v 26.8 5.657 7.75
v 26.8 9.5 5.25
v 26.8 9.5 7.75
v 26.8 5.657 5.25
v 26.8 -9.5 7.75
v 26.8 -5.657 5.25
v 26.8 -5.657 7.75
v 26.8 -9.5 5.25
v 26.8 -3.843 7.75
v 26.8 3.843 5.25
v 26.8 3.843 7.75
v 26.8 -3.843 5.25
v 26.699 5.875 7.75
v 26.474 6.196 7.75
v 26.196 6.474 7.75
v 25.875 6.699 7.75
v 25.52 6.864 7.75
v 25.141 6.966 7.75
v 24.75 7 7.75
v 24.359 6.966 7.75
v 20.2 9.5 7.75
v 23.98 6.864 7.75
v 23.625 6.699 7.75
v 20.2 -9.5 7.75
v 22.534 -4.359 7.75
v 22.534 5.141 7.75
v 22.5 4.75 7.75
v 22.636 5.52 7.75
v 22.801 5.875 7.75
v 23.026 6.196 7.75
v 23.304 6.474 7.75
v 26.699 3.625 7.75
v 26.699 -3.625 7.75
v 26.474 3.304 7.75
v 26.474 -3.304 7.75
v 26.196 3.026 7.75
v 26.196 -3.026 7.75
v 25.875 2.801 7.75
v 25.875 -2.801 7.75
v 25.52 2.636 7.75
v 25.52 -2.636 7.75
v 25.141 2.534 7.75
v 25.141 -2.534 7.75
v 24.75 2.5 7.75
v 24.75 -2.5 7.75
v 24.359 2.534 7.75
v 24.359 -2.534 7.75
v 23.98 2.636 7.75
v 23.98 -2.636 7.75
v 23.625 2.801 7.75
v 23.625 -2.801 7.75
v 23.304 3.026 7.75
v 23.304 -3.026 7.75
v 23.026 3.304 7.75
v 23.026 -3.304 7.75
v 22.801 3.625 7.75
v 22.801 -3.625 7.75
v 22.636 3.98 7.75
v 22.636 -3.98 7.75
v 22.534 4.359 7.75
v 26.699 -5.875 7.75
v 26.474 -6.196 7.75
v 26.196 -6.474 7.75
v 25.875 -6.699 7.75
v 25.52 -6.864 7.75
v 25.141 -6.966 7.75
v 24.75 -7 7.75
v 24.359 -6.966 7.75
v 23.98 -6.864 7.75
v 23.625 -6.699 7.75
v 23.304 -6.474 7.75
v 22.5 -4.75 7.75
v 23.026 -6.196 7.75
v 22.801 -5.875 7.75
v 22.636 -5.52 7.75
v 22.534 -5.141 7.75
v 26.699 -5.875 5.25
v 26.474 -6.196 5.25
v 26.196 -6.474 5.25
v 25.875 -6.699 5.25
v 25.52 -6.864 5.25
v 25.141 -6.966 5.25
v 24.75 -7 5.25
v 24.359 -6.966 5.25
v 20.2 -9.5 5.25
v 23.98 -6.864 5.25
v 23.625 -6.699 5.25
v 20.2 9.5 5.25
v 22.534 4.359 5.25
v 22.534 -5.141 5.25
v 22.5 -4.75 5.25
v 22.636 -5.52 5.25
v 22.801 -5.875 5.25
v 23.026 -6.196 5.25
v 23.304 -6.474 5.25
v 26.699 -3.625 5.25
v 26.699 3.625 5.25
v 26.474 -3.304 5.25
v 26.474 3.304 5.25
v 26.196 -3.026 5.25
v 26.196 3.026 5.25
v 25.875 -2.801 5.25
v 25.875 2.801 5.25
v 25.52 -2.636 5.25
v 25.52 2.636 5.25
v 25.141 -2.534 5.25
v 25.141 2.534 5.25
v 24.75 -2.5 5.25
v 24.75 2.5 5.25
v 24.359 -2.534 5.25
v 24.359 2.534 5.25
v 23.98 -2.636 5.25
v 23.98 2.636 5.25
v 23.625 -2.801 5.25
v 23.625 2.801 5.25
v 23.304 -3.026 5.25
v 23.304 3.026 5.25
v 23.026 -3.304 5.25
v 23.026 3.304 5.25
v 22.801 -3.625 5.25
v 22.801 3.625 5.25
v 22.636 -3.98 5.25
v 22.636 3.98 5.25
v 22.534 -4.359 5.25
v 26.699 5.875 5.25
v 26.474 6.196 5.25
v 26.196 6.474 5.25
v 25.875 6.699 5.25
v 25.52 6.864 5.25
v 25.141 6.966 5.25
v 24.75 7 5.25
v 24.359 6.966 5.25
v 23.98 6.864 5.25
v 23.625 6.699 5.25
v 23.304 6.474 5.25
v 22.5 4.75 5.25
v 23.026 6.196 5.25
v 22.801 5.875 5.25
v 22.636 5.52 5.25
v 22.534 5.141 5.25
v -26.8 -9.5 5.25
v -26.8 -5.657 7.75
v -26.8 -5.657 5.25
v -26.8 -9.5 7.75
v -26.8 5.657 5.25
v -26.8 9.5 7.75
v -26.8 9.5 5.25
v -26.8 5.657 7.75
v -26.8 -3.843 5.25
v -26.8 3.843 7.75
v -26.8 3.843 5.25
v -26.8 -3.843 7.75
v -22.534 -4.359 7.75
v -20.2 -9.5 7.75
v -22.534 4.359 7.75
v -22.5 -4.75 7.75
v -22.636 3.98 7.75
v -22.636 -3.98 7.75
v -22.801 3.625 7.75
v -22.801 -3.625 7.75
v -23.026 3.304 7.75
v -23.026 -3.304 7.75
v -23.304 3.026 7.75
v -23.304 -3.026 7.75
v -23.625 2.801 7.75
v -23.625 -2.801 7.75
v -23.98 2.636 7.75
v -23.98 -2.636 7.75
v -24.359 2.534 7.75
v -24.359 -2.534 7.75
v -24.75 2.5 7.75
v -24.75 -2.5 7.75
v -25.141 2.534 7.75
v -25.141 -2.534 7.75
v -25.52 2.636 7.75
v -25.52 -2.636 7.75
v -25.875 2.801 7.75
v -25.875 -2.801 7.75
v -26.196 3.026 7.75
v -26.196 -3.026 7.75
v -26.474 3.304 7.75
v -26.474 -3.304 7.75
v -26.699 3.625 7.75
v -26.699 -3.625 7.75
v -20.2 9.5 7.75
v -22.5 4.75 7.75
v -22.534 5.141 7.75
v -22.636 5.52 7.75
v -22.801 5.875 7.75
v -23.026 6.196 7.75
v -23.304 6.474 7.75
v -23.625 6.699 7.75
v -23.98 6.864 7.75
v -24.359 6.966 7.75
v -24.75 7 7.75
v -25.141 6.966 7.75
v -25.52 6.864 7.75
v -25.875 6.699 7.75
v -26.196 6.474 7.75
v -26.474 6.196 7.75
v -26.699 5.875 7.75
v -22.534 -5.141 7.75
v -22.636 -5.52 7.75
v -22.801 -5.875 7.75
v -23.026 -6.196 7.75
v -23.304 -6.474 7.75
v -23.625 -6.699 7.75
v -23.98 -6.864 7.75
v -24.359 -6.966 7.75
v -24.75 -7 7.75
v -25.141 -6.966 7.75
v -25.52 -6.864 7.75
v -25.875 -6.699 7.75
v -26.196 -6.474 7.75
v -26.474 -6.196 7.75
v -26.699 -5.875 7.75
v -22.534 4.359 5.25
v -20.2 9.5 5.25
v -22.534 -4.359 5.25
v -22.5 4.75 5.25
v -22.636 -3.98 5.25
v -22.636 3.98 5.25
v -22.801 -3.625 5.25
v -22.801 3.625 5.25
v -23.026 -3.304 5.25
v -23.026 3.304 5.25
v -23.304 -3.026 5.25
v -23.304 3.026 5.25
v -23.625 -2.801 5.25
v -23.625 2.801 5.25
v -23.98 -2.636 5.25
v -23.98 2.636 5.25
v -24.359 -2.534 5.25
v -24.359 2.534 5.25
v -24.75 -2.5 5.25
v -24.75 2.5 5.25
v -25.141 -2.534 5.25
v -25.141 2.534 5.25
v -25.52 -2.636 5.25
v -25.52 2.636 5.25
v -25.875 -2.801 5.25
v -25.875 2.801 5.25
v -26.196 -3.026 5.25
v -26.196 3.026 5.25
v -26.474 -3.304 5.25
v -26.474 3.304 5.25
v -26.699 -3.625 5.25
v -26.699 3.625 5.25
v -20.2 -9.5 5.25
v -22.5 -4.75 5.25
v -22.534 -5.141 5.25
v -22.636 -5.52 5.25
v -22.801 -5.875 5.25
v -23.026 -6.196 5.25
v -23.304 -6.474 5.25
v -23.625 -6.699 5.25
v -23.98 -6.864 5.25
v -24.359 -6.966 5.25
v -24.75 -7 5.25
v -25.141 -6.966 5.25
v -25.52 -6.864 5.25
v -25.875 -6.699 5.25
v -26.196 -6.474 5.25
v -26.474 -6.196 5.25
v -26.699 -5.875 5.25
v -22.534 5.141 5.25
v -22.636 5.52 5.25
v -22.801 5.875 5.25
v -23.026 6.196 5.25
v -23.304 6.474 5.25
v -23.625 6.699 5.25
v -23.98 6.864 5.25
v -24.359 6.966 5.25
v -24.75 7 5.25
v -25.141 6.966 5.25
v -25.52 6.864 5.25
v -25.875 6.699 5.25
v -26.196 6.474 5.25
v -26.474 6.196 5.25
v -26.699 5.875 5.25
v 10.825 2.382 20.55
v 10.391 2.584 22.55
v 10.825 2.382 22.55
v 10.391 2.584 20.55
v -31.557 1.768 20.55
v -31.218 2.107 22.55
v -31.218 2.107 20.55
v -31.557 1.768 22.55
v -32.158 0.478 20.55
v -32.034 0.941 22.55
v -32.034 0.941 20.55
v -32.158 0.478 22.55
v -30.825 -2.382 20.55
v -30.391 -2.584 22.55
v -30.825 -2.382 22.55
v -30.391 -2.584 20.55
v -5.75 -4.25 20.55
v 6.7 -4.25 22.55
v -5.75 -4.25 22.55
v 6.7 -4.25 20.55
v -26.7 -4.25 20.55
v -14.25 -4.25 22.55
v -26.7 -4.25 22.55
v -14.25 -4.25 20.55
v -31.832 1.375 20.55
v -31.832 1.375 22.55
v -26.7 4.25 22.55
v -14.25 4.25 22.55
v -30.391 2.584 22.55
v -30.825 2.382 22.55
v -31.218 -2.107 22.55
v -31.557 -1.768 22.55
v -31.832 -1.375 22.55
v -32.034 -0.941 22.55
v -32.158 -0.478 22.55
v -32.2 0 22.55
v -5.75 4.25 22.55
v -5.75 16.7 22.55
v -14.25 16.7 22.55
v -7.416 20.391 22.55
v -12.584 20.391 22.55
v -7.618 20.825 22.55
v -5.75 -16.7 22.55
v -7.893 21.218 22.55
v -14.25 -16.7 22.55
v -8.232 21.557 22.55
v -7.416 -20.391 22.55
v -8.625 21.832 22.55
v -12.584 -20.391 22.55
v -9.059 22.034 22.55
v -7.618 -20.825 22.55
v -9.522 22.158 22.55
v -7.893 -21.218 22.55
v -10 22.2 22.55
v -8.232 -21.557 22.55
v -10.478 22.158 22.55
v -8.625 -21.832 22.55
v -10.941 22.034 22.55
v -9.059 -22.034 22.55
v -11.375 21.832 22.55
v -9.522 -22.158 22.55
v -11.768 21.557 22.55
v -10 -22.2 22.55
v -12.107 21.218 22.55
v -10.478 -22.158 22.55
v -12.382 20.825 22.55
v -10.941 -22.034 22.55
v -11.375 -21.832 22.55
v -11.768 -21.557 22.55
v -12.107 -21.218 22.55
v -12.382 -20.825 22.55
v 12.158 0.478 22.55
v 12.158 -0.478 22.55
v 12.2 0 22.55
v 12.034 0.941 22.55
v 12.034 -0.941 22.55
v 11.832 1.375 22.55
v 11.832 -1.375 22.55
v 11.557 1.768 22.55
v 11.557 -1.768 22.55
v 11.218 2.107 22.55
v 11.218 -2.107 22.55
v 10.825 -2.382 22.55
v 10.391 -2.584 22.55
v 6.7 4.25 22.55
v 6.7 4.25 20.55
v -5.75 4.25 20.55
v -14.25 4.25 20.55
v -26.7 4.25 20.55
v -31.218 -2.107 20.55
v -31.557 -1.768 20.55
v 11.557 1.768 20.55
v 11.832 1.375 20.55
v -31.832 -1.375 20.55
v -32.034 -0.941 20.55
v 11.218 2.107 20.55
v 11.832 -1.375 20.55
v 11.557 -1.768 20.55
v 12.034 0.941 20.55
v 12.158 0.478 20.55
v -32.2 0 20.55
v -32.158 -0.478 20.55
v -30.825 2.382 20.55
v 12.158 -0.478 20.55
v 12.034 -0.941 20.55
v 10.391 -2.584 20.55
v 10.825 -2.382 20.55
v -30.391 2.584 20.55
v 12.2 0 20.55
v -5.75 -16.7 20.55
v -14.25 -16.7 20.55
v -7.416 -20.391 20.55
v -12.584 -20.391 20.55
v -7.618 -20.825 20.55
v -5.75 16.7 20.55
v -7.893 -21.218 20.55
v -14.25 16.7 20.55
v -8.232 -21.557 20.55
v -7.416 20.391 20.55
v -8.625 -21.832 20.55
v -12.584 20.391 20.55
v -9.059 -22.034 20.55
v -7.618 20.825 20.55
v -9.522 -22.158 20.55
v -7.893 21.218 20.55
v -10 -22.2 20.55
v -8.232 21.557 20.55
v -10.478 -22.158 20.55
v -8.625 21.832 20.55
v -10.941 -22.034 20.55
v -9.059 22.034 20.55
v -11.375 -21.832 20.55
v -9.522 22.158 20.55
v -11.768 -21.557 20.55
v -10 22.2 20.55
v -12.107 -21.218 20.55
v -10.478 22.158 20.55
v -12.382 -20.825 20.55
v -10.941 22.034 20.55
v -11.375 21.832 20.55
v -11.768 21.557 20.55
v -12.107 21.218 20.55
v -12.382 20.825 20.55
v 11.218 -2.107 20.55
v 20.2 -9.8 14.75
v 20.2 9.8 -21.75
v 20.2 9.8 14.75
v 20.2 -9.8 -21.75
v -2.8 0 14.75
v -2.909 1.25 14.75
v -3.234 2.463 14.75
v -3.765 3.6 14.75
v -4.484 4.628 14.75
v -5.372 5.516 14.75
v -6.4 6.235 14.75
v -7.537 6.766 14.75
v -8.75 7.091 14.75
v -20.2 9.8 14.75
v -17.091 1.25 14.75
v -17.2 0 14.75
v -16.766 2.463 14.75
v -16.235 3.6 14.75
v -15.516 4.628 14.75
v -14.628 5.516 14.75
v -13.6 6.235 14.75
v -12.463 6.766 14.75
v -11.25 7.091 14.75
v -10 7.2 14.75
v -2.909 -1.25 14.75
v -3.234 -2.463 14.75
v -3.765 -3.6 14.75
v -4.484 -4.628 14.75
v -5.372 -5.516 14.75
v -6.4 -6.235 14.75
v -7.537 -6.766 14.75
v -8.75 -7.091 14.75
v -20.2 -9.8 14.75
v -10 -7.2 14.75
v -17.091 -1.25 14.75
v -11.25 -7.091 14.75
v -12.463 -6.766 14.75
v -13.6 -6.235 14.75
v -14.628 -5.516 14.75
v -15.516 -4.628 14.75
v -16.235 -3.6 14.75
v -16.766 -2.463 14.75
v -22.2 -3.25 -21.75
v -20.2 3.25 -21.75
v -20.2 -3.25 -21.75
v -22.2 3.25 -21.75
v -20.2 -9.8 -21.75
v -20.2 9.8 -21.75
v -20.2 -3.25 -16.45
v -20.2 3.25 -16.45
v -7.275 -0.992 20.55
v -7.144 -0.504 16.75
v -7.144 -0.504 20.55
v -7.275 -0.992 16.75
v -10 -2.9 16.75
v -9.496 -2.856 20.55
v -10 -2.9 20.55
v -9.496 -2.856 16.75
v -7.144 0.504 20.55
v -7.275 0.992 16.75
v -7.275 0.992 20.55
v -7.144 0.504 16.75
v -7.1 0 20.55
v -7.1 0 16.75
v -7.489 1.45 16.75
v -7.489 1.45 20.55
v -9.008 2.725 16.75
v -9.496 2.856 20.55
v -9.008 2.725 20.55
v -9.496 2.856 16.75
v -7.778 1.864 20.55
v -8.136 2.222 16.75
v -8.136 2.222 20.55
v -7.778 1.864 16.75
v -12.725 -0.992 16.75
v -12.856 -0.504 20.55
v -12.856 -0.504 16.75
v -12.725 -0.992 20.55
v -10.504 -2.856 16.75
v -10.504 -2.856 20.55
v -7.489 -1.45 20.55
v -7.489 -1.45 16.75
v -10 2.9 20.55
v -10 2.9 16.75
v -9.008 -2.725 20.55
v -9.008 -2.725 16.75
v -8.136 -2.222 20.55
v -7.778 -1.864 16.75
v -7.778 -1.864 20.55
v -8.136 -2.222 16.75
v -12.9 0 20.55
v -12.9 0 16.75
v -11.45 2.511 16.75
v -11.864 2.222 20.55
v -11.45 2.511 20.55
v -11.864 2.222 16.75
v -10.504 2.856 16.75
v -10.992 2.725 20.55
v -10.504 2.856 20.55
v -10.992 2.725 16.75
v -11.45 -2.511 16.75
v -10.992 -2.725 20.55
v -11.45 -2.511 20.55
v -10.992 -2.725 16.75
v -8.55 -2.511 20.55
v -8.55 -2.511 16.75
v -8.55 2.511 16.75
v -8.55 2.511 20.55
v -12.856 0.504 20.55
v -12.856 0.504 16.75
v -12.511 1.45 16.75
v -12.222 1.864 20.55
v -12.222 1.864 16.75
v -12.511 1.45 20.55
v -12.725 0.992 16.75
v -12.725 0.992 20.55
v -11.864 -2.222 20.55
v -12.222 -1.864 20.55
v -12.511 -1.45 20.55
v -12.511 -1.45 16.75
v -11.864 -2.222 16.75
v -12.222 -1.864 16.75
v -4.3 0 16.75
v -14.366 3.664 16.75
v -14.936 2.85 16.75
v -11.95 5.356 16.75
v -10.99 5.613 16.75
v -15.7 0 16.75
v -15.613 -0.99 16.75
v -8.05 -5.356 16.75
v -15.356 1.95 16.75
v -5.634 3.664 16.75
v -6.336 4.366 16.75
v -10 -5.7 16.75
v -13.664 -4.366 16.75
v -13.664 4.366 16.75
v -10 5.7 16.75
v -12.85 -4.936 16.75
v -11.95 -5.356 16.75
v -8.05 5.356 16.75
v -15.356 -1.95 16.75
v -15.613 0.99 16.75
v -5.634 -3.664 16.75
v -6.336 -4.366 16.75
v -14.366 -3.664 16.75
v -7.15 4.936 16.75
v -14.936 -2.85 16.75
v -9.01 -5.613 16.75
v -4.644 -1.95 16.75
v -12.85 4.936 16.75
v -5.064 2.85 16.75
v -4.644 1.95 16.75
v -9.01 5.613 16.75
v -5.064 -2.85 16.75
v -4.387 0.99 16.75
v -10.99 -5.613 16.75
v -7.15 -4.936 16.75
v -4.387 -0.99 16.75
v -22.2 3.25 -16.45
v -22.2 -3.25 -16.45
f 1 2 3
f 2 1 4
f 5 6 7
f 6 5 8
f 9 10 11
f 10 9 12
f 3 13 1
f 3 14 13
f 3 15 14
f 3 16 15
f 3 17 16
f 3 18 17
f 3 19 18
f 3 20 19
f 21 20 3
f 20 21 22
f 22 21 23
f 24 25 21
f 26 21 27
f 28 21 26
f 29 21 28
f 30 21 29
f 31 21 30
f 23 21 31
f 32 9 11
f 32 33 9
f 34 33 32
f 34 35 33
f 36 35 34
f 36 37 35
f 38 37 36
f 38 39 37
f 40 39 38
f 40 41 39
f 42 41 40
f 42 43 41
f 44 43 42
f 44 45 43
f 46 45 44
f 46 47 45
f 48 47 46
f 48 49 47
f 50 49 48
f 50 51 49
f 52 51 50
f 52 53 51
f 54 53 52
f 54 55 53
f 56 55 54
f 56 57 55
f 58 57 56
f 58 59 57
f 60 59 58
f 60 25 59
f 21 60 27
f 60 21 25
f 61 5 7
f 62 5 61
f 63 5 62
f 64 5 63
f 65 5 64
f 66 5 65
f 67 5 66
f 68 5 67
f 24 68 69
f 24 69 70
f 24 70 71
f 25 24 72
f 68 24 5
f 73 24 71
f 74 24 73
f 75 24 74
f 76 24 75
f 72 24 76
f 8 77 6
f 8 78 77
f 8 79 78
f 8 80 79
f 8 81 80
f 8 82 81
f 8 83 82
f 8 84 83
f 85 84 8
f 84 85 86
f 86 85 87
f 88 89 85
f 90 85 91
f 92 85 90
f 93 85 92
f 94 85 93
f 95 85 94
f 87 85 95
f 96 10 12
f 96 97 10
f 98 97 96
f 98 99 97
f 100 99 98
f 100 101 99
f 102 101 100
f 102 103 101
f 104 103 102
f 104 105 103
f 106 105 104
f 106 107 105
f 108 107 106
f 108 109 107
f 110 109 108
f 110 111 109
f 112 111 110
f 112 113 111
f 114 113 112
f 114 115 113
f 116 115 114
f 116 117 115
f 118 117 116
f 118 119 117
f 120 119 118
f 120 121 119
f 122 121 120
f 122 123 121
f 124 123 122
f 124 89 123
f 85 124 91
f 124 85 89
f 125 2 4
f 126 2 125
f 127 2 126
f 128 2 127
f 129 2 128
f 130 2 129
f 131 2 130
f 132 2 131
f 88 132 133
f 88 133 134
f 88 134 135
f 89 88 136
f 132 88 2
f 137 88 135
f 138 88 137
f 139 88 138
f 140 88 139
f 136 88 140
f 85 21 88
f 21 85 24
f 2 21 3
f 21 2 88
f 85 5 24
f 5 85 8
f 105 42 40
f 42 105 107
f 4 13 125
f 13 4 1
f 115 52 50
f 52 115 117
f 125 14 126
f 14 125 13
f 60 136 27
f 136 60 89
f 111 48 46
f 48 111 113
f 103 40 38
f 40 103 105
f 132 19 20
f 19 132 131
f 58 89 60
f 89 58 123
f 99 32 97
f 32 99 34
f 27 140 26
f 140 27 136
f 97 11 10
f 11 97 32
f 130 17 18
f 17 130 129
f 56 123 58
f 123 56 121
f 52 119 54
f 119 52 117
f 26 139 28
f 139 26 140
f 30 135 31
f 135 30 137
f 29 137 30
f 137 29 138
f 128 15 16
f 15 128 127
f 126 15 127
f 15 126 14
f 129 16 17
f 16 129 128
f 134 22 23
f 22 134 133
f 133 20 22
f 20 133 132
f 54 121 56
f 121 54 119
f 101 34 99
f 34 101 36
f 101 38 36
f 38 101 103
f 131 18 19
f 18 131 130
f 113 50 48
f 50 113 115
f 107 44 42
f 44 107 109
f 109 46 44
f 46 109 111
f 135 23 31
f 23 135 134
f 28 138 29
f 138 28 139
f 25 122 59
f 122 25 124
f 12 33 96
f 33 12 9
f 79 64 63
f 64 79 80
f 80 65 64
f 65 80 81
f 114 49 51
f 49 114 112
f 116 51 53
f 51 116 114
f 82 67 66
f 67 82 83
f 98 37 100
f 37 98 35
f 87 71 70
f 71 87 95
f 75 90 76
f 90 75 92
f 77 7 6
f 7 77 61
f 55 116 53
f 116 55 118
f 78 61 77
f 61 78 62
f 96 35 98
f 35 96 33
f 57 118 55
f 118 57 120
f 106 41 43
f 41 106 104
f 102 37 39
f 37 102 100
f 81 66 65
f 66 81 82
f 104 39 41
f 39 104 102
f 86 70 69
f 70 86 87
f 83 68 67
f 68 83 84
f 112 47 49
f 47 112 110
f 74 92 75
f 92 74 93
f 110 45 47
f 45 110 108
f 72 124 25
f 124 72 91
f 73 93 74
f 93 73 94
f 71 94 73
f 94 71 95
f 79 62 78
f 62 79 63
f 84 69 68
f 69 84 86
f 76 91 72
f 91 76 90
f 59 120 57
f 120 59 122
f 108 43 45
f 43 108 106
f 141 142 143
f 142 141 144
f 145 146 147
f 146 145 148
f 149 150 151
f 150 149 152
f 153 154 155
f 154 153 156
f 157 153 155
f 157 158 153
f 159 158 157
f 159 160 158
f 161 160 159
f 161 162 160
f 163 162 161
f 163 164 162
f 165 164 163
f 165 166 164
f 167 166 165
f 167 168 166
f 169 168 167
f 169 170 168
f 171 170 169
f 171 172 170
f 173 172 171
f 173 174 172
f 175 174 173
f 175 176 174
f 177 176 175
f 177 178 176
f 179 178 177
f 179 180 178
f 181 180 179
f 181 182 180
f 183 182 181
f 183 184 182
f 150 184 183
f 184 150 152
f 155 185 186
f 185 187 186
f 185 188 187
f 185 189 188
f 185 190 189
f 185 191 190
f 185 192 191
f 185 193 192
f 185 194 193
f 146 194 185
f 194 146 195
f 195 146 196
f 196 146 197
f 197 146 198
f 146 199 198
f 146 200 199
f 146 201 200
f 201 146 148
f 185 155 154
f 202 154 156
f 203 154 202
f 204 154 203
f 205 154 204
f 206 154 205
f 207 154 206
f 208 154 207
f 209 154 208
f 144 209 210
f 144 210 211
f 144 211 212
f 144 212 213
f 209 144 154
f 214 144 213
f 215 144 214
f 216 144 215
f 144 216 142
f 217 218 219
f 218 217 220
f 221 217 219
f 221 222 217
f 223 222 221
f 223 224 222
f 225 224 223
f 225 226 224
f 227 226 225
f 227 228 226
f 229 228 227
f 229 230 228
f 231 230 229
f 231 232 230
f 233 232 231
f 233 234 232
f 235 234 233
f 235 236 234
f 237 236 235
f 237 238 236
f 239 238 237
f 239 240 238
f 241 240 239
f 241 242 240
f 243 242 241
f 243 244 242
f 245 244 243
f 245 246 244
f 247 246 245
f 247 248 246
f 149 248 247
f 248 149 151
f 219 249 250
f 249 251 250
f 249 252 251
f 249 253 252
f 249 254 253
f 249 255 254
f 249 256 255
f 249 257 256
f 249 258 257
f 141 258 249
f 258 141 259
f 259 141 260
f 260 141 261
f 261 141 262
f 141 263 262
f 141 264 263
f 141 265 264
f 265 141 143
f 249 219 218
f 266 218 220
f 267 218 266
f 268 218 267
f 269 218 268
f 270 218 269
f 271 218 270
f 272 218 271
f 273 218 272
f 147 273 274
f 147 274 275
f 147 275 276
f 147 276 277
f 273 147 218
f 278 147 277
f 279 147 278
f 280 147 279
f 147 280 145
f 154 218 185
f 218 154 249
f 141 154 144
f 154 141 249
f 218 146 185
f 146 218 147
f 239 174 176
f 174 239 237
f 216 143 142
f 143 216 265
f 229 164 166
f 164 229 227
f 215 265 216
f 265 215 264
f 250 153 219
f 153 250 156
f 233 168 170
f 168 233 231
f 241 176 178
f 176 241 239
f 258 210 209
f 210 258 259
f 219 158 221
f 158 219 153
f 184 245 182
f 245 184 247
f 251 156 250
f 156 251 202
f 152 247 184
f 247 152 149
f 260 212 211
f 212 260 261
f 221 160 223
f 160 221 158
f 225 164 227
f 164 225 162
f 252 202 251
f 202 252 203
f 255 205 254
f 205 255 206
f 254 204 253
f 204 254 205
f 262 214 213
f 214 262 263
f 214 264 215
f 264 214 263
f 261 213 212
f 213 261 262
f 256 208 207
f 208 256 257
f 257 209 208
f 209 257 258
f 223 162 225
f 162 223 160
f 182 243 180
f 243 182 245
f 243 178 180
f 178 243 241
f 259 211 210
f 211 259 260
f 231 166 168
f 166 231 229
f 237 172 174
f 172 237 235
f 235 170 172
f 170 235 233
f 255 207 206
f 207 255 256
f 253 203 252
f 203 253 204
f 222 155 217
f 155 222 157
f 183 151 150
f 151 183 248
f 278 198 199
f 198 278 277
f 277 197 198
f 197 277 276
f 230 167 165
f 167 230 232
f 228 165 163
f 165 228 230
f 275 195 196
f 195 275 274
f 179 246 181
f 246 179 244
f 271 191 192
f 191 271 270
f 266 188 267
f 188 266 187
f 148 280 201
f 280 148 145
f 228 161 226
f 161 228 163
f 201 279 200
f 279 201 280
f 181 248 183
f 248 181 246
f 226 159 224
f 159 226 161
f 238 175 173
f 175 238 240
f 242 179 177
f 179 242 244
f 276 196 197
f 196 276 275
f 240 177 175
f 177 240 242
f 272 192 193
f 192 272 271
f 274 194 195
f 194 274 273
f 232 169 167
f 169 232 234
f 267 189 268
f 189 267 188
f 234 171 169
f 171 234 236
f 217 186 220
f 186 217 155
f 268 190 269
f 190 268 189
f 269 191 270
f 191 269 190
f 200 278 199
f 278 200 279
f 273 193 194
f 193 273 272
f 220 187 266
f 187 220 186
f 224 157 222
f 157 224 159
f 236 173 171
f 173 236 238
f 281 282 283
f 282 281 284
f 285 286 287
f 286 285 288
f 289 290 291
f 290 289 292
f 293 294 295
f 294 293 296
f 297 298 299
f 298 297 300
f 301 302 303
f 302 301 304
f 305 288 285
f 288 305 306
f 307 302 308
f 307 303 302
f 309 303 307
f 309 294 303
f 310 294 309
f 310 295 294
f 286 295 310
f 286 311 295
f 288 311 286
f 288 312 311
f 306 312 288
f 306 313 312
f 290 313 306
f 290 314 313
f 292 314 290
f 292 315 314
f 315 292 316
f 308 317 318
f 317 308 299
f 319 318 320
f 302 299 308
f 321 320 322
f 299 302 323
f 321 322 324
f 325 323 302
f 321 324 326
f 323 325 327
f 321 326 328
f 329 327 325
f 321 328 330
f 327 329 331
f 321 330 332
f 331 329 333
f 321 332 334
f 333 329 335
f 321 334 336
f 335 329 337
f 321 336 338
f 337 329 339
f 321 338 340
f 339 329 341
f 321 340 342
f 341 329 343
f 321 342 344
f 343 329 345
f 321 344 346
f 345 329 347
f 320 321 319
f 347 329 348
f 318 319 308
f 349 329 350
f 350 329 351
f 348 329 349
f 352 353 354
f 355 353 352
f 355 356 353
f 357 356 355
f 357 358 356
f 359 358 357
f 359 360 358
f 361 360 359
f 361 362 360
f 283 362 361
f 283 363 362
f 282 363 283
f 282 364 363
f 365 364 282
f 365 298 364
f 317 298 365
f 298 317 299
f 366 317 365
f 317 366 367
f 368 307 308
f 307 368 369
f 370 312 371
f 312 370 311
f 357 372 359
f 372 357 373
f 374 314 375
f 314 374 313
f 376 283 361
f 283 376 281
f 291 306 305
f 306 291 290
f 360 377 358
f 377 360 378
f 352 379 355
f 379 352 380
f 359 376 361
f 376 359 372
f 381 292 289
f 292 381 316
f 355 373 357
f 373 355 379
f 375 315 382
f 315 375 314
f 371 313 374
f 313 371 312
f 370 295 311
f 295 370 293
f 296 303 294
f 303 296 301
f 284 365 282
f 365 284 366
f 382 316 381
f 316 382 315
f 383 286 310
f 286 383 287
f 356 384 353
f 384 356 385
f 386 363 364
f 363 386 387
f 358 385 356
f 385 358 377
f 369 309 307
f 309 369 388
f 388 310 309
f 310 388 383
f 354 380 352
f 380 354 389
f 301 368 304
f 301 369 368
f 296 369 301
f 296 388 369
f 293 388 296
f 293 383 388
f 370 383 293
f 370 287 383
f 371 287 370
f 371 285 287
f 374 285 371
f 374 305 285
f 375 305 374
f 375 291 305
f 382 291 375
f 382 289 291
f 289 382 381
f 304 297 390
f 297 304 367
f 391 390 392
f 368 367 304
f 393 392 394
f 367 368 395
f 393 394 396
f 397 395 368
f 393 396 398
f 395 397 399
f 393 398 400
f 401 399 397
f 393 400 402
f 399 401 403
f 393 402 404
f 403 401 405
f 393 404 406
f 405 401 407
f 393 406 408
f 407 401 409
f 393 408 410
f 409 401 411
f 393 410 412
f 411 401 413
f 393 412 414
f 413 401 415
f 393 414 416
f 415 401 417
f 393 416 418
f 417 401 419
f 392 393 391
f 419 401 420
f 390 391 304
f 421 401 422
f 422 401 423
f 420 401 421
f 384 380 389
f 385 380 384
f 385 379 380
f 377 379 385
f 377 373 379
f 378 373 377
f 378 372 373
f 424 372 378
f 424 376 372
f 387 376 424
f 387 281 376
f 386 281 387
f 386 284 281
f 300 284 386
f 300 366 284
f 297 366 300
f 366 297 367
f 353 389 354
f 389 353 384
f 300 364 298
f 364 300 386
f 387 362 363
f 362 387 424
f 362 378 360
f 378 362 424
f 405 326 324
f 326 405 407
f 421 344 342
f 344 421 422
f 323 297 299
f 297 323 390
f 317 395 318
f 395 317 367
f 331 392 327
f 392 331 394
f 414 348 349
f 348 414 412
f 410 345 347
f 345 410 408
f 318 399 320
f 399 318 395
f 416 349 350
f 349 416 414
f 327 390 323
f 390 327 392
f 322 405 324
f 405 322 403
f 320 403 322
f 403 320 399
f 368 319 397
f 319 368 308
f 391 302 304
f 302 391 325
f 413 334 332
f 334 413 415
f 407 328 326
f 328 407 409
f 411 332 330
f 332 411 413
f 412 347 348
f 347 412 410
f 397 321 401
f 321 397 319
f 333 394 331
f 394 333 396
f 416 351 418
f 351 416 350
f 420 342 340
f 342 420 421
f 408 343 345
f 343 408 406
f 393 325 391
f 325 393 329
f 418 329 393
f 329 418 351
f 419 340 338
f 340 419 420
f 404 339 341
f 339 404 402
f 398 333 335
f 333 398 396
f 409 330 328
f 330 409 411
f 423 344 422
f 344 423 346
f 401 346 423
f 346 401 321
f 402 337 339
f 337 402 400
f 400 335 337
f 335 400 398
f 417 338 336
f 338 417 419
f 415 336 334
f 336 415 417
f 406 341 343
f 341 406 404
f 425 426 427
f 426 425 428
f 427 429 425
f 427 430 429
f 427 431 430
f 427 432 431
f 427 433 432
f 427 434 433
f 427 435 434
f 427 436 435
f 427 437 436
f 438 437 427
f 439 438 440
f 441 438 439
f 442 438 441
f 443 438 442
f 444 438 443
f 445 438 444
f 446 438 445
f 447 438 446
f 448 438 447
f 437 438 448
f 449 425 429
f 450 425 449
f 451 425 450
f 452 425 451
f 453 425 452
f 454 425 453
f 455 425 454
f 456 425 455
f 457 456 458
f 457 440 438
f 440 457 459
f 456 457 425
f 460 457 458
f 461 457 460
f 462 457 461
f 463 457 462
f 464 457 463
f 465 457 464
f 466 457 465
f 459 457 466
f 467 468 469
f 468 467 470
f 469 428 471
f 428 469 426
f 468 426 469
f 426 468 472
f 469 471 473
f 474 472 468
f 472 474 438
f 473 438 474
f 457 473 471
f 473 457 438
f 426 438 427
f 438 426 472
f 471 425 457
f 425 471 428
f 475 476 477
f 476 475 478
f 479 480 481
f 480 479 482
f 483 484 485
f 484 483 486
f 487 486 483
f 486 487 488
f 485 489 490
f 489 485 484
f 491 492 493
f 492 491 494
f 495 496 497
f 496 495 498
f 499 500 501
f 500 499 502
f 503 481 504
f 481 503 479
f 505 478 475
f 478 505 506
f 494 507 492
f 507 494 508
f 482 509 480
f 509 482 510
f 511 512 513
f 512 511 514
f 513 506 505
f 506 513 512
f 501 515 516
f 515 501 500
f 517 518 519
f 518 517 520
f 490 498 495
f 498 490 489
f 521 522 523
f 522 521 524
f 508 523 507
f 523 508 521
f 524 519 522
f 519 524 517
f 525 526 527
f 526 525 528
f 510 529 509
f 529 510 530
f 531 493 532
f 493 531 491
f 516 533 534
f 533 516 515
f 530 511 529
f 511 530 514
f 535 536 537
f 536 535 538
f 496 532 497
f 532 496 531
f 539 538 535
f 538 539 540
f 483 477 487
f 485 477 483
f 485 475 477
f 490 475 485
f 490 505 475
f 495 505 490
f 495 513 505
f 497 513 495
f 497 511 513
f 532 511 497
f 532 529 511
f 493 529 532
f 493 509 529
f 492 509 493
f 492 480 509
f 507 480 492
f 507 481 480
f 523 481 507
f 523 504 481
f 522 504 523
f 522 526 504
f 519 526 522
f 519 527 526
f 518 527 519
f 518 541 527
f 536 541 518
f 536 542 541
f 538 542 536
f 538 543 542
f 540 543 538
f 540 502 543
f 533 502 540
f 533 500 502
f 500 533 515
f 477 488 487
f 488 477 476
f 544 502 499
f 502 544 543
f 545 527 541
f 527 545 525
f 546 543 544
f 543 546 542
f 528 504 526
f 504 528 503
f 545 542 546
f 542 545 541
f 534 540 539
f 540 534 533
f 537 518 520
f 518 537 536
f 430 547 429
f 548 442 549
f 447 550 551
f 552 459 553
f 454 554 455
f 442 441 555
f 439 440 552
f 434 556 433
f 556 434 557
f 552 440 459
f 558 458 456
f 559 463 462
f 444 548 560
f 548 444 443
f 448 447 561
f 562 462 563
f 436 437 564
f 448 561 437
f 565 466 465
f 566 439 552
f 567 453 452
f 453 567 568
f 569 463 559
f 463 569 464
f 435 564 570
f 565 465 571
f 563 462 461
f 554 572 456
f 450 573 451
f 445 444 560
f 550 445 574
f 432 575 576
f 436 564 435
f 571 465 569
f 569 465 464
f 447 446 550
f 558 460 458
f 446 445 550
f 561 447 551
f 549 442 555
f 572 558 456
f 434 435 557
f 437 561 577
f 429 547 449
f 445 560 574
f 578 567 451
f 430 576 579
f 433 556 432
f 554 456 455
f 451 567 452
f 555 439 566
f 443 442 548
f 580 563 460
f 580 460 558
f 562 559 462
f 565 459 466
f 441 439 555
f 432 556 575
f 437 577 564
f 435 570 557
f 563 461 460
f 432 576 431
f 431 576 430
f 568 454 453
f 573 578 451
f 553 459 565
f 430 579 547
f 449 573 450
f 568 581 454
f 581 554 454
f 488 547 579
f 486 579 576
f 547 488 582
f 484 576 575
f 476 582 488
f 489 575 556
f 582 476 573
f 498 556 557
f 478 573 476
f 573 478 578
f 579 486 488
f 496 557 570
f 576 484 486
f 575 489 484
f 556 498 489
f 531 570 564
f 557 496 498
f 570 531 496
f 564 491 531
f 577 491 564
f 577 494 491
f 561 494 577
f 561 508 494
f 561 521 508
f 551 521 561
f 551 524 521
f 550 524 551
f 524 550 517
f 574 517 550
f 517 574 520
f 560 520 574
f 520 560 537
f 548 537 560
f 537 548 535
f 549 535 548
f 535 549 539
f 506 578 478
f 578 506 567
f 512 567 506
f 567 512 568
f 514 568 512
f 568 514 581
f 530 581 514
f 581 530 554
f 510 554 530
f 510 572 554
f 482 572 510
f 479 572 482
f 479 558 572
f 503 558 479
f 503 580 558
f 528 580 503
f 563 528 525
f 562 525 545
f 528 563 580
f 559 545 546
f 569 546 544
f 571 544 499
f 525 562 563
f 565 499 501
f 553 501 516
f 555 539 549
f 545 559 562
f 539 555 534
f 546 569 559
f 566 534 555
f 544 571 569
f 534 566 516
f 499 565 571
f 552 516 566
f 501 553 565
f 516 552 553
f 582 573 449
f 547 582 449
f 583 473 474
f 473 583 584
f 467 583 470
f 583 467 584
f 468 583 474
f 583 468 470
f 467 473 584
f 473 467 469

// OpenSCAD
/*
Futaba S3004 servo
Aaron Ciuffo - aaron dot ciuffo 2 gmail

This library produces a futaba S3004 futaba servo or a projection for cutting
a hole in a 2D shape for a laser cutter.  

The scale of the projected hole for the body can be adjusted below

It can be used in other models by calling:

  import <futaba_s3004.scad>
  futaba();

The library can also produce a 2D projection that is useful for making a cutout for
a DXF to be used with a laser cutter:
  futaba(project=true)
 
To produce a projection that includes pilot holes for wood screws use:
  futaba(project, bolt=false);




V1 11 November 2014


*/
/*[Setup]*/
$fn=36; //curve refinement

/*[Body Dimensions]*/
bX=40.4;
bY=19.6;
bZ=36.5;

/*[Flange Dimensions and position]*/
fX=6.6;
fY=19;
fZ=2.5;
//flange distance from Base
flangeFromB=21.75;
fBoltDia=4.5;
fBoltRad=fBoltDia/2;
fScrewDia=2.1;
fScrewRad=fScrewDia/2;
fScrewPilot=fScrewRad*.5;

//position from edges
fScrewY=2.5;
fScrewX=-0.2;
fScrewZ=7.0;

/*[Shaft Dimensions and Position]*/
shaftDia=5.8;
shaftRad=shaftDia/2;
shaftZ=5.8;
shaftX=7.3+shaftRad;
shaftS1=14.4/2;
shaftS2=11.4/2;
shaftSZ=2;

/*[Horn Dimensions]*/
hornZ=2.0; 
hornX=38.9;
hornY=hornX;
hornArmX=8.5;
hornRad=5.5/2;

//horn location
hornZoverB=7.8; //height of horn over top of body
hornZoverShaft=hornZoverB-shaftZ; //horn height over shaft



/*[Wire Gland]*/
wireX=2;
wireY=6.5;
wireZ=5.3;


module horn() {
  union() {
    hull() {
      cube([hornX-2*hornRad, hornArmX, hornZ], center=true);
      translate([hornX/2, 0, 0])
        cylinder(h=hornZ, r=hornRad, center=true);
      translate([-hornX/2, 0, 0])
        cylinder(h=hornZ, r=hornRad, center=true);

    }
    
    hull() {
      cube([hornArmX, hornY-2*hornRad, hornZ], center=true);
       translate([0, hornY/2, 0])
        cylinder(h=hornZ, r=hornRad, center=true);
      translate([0, -hornY/2, 0])
        cylinder(h=hornZ, r=hornRad, center=true);
   }
 }
    
  
}

module flange(project=false, bolt=true) {
  fHoleRad= bolt==true ? fBoltRad : fScrewPilot;

  if (project==false) {
    difference() {
      cube([fX, fY, fZ], center=true);
      
      translate([fX/2-fBoltRad-fScrewX, fY/2-fBoltRad-fScrewY, 0])

        cylinder(h=fZ*2, r=fHoleRad, center=true);
      translate([fX/2-fBoltRad-fScrewX, -fY/2+fBoltRad+fScrewY, 0])
        cylinder(h=fZ*2, r=fHoleRad, center=true);
    }
  }

  //leave the cylinders in place for projecting a bolt hole
  if (project==true) {
    translate([fX/2-fBoltRad-fScrewX, fY/2-fBoltRad-fScrewY, 0])
      cylinder(h=fZ*2, r=fHoleRad, center=true);
    translate([fX/2-fBoltRad-fScrewX, -fY/2+fBoltRad+fScrewY, 0])
      cylinder(h=fZ*2, r=fHoleRad, center=true);
  
  }

}


module body(project=false, bolt=true, scalePct=1.05, horn=false) {
  scalePctLoc= project==true ? scalePct : 1;
  union() {
    color("gray")
      scale(scalePctLoc) cube([bX, bY, bZ], center=true);
    color("red")
      translate([bX/2+fX/2, 0, bZ/2-fZ/2-fScrewZ])
        flange(project, bolt);
    color("red")
      translate([-bX/2-fX/2, 0, bZ/2-fZ/2-fScrewZ]) rotate([0, 0, 180])
        flange(project, bolt);
    translate([-bX/2+shaftX, 0, bZ/2]) color("green")
      cylinder(h=shaftZ, r=shaftRad);
    translate([-bX/2+shaftX, 0, bZ/2]) color("blue")
      cylinder(h=shaftSZ, r1=shaftS1, r2=shaftS2);
    color("purple")
      translate([-bX/2-wireX/2, 0, -bZ/2+wireZ/2])
        cube([wireX, wireY, wireZ], center=true);
    if (horn==true) {
      color("yellow")
        translate([-bX/2+shaftX, 0, bZ/2+shaftZ-hornZ/2+hornZoverShaft])
          horn();
    }
  }

}

module servo(project=false, bolt=true, scalePct, center="main", horn=false) {
  
  //hrn=horn; //WTF?  why do I need this?
  // move everything down to put the horn at the origin
  hornZoffset= horn==true ? hornZoverShaft : 0;

  if (project==true) {
    if (center=="shaft") {
      translate([bX/2-shaftX, 0, 0])
        projection() body(project, bolt, scalePct);
    } else {
      projection() body(project, bolt, scalePct);
    }
  } else {
    if (center=="shaft") {
      translate([bX/2-shaftX, 0, -bZ/2-shaftZ-hornZoffset])
        body(project, bolt, horn=horn);
    } else if (center=="flange") {
      translate([0, 0, -bZ/2+(bZ-flangeFromB)])
        body(project, bolt, horn=horn);
      
    } else {
      body(project, bolt, horn=horn);
    }
  }
}

servo(project=false, bolt=true, center="flange", horn=true);
//servo(project=true, center="flange", bolt=true, scalePct=1.0);
